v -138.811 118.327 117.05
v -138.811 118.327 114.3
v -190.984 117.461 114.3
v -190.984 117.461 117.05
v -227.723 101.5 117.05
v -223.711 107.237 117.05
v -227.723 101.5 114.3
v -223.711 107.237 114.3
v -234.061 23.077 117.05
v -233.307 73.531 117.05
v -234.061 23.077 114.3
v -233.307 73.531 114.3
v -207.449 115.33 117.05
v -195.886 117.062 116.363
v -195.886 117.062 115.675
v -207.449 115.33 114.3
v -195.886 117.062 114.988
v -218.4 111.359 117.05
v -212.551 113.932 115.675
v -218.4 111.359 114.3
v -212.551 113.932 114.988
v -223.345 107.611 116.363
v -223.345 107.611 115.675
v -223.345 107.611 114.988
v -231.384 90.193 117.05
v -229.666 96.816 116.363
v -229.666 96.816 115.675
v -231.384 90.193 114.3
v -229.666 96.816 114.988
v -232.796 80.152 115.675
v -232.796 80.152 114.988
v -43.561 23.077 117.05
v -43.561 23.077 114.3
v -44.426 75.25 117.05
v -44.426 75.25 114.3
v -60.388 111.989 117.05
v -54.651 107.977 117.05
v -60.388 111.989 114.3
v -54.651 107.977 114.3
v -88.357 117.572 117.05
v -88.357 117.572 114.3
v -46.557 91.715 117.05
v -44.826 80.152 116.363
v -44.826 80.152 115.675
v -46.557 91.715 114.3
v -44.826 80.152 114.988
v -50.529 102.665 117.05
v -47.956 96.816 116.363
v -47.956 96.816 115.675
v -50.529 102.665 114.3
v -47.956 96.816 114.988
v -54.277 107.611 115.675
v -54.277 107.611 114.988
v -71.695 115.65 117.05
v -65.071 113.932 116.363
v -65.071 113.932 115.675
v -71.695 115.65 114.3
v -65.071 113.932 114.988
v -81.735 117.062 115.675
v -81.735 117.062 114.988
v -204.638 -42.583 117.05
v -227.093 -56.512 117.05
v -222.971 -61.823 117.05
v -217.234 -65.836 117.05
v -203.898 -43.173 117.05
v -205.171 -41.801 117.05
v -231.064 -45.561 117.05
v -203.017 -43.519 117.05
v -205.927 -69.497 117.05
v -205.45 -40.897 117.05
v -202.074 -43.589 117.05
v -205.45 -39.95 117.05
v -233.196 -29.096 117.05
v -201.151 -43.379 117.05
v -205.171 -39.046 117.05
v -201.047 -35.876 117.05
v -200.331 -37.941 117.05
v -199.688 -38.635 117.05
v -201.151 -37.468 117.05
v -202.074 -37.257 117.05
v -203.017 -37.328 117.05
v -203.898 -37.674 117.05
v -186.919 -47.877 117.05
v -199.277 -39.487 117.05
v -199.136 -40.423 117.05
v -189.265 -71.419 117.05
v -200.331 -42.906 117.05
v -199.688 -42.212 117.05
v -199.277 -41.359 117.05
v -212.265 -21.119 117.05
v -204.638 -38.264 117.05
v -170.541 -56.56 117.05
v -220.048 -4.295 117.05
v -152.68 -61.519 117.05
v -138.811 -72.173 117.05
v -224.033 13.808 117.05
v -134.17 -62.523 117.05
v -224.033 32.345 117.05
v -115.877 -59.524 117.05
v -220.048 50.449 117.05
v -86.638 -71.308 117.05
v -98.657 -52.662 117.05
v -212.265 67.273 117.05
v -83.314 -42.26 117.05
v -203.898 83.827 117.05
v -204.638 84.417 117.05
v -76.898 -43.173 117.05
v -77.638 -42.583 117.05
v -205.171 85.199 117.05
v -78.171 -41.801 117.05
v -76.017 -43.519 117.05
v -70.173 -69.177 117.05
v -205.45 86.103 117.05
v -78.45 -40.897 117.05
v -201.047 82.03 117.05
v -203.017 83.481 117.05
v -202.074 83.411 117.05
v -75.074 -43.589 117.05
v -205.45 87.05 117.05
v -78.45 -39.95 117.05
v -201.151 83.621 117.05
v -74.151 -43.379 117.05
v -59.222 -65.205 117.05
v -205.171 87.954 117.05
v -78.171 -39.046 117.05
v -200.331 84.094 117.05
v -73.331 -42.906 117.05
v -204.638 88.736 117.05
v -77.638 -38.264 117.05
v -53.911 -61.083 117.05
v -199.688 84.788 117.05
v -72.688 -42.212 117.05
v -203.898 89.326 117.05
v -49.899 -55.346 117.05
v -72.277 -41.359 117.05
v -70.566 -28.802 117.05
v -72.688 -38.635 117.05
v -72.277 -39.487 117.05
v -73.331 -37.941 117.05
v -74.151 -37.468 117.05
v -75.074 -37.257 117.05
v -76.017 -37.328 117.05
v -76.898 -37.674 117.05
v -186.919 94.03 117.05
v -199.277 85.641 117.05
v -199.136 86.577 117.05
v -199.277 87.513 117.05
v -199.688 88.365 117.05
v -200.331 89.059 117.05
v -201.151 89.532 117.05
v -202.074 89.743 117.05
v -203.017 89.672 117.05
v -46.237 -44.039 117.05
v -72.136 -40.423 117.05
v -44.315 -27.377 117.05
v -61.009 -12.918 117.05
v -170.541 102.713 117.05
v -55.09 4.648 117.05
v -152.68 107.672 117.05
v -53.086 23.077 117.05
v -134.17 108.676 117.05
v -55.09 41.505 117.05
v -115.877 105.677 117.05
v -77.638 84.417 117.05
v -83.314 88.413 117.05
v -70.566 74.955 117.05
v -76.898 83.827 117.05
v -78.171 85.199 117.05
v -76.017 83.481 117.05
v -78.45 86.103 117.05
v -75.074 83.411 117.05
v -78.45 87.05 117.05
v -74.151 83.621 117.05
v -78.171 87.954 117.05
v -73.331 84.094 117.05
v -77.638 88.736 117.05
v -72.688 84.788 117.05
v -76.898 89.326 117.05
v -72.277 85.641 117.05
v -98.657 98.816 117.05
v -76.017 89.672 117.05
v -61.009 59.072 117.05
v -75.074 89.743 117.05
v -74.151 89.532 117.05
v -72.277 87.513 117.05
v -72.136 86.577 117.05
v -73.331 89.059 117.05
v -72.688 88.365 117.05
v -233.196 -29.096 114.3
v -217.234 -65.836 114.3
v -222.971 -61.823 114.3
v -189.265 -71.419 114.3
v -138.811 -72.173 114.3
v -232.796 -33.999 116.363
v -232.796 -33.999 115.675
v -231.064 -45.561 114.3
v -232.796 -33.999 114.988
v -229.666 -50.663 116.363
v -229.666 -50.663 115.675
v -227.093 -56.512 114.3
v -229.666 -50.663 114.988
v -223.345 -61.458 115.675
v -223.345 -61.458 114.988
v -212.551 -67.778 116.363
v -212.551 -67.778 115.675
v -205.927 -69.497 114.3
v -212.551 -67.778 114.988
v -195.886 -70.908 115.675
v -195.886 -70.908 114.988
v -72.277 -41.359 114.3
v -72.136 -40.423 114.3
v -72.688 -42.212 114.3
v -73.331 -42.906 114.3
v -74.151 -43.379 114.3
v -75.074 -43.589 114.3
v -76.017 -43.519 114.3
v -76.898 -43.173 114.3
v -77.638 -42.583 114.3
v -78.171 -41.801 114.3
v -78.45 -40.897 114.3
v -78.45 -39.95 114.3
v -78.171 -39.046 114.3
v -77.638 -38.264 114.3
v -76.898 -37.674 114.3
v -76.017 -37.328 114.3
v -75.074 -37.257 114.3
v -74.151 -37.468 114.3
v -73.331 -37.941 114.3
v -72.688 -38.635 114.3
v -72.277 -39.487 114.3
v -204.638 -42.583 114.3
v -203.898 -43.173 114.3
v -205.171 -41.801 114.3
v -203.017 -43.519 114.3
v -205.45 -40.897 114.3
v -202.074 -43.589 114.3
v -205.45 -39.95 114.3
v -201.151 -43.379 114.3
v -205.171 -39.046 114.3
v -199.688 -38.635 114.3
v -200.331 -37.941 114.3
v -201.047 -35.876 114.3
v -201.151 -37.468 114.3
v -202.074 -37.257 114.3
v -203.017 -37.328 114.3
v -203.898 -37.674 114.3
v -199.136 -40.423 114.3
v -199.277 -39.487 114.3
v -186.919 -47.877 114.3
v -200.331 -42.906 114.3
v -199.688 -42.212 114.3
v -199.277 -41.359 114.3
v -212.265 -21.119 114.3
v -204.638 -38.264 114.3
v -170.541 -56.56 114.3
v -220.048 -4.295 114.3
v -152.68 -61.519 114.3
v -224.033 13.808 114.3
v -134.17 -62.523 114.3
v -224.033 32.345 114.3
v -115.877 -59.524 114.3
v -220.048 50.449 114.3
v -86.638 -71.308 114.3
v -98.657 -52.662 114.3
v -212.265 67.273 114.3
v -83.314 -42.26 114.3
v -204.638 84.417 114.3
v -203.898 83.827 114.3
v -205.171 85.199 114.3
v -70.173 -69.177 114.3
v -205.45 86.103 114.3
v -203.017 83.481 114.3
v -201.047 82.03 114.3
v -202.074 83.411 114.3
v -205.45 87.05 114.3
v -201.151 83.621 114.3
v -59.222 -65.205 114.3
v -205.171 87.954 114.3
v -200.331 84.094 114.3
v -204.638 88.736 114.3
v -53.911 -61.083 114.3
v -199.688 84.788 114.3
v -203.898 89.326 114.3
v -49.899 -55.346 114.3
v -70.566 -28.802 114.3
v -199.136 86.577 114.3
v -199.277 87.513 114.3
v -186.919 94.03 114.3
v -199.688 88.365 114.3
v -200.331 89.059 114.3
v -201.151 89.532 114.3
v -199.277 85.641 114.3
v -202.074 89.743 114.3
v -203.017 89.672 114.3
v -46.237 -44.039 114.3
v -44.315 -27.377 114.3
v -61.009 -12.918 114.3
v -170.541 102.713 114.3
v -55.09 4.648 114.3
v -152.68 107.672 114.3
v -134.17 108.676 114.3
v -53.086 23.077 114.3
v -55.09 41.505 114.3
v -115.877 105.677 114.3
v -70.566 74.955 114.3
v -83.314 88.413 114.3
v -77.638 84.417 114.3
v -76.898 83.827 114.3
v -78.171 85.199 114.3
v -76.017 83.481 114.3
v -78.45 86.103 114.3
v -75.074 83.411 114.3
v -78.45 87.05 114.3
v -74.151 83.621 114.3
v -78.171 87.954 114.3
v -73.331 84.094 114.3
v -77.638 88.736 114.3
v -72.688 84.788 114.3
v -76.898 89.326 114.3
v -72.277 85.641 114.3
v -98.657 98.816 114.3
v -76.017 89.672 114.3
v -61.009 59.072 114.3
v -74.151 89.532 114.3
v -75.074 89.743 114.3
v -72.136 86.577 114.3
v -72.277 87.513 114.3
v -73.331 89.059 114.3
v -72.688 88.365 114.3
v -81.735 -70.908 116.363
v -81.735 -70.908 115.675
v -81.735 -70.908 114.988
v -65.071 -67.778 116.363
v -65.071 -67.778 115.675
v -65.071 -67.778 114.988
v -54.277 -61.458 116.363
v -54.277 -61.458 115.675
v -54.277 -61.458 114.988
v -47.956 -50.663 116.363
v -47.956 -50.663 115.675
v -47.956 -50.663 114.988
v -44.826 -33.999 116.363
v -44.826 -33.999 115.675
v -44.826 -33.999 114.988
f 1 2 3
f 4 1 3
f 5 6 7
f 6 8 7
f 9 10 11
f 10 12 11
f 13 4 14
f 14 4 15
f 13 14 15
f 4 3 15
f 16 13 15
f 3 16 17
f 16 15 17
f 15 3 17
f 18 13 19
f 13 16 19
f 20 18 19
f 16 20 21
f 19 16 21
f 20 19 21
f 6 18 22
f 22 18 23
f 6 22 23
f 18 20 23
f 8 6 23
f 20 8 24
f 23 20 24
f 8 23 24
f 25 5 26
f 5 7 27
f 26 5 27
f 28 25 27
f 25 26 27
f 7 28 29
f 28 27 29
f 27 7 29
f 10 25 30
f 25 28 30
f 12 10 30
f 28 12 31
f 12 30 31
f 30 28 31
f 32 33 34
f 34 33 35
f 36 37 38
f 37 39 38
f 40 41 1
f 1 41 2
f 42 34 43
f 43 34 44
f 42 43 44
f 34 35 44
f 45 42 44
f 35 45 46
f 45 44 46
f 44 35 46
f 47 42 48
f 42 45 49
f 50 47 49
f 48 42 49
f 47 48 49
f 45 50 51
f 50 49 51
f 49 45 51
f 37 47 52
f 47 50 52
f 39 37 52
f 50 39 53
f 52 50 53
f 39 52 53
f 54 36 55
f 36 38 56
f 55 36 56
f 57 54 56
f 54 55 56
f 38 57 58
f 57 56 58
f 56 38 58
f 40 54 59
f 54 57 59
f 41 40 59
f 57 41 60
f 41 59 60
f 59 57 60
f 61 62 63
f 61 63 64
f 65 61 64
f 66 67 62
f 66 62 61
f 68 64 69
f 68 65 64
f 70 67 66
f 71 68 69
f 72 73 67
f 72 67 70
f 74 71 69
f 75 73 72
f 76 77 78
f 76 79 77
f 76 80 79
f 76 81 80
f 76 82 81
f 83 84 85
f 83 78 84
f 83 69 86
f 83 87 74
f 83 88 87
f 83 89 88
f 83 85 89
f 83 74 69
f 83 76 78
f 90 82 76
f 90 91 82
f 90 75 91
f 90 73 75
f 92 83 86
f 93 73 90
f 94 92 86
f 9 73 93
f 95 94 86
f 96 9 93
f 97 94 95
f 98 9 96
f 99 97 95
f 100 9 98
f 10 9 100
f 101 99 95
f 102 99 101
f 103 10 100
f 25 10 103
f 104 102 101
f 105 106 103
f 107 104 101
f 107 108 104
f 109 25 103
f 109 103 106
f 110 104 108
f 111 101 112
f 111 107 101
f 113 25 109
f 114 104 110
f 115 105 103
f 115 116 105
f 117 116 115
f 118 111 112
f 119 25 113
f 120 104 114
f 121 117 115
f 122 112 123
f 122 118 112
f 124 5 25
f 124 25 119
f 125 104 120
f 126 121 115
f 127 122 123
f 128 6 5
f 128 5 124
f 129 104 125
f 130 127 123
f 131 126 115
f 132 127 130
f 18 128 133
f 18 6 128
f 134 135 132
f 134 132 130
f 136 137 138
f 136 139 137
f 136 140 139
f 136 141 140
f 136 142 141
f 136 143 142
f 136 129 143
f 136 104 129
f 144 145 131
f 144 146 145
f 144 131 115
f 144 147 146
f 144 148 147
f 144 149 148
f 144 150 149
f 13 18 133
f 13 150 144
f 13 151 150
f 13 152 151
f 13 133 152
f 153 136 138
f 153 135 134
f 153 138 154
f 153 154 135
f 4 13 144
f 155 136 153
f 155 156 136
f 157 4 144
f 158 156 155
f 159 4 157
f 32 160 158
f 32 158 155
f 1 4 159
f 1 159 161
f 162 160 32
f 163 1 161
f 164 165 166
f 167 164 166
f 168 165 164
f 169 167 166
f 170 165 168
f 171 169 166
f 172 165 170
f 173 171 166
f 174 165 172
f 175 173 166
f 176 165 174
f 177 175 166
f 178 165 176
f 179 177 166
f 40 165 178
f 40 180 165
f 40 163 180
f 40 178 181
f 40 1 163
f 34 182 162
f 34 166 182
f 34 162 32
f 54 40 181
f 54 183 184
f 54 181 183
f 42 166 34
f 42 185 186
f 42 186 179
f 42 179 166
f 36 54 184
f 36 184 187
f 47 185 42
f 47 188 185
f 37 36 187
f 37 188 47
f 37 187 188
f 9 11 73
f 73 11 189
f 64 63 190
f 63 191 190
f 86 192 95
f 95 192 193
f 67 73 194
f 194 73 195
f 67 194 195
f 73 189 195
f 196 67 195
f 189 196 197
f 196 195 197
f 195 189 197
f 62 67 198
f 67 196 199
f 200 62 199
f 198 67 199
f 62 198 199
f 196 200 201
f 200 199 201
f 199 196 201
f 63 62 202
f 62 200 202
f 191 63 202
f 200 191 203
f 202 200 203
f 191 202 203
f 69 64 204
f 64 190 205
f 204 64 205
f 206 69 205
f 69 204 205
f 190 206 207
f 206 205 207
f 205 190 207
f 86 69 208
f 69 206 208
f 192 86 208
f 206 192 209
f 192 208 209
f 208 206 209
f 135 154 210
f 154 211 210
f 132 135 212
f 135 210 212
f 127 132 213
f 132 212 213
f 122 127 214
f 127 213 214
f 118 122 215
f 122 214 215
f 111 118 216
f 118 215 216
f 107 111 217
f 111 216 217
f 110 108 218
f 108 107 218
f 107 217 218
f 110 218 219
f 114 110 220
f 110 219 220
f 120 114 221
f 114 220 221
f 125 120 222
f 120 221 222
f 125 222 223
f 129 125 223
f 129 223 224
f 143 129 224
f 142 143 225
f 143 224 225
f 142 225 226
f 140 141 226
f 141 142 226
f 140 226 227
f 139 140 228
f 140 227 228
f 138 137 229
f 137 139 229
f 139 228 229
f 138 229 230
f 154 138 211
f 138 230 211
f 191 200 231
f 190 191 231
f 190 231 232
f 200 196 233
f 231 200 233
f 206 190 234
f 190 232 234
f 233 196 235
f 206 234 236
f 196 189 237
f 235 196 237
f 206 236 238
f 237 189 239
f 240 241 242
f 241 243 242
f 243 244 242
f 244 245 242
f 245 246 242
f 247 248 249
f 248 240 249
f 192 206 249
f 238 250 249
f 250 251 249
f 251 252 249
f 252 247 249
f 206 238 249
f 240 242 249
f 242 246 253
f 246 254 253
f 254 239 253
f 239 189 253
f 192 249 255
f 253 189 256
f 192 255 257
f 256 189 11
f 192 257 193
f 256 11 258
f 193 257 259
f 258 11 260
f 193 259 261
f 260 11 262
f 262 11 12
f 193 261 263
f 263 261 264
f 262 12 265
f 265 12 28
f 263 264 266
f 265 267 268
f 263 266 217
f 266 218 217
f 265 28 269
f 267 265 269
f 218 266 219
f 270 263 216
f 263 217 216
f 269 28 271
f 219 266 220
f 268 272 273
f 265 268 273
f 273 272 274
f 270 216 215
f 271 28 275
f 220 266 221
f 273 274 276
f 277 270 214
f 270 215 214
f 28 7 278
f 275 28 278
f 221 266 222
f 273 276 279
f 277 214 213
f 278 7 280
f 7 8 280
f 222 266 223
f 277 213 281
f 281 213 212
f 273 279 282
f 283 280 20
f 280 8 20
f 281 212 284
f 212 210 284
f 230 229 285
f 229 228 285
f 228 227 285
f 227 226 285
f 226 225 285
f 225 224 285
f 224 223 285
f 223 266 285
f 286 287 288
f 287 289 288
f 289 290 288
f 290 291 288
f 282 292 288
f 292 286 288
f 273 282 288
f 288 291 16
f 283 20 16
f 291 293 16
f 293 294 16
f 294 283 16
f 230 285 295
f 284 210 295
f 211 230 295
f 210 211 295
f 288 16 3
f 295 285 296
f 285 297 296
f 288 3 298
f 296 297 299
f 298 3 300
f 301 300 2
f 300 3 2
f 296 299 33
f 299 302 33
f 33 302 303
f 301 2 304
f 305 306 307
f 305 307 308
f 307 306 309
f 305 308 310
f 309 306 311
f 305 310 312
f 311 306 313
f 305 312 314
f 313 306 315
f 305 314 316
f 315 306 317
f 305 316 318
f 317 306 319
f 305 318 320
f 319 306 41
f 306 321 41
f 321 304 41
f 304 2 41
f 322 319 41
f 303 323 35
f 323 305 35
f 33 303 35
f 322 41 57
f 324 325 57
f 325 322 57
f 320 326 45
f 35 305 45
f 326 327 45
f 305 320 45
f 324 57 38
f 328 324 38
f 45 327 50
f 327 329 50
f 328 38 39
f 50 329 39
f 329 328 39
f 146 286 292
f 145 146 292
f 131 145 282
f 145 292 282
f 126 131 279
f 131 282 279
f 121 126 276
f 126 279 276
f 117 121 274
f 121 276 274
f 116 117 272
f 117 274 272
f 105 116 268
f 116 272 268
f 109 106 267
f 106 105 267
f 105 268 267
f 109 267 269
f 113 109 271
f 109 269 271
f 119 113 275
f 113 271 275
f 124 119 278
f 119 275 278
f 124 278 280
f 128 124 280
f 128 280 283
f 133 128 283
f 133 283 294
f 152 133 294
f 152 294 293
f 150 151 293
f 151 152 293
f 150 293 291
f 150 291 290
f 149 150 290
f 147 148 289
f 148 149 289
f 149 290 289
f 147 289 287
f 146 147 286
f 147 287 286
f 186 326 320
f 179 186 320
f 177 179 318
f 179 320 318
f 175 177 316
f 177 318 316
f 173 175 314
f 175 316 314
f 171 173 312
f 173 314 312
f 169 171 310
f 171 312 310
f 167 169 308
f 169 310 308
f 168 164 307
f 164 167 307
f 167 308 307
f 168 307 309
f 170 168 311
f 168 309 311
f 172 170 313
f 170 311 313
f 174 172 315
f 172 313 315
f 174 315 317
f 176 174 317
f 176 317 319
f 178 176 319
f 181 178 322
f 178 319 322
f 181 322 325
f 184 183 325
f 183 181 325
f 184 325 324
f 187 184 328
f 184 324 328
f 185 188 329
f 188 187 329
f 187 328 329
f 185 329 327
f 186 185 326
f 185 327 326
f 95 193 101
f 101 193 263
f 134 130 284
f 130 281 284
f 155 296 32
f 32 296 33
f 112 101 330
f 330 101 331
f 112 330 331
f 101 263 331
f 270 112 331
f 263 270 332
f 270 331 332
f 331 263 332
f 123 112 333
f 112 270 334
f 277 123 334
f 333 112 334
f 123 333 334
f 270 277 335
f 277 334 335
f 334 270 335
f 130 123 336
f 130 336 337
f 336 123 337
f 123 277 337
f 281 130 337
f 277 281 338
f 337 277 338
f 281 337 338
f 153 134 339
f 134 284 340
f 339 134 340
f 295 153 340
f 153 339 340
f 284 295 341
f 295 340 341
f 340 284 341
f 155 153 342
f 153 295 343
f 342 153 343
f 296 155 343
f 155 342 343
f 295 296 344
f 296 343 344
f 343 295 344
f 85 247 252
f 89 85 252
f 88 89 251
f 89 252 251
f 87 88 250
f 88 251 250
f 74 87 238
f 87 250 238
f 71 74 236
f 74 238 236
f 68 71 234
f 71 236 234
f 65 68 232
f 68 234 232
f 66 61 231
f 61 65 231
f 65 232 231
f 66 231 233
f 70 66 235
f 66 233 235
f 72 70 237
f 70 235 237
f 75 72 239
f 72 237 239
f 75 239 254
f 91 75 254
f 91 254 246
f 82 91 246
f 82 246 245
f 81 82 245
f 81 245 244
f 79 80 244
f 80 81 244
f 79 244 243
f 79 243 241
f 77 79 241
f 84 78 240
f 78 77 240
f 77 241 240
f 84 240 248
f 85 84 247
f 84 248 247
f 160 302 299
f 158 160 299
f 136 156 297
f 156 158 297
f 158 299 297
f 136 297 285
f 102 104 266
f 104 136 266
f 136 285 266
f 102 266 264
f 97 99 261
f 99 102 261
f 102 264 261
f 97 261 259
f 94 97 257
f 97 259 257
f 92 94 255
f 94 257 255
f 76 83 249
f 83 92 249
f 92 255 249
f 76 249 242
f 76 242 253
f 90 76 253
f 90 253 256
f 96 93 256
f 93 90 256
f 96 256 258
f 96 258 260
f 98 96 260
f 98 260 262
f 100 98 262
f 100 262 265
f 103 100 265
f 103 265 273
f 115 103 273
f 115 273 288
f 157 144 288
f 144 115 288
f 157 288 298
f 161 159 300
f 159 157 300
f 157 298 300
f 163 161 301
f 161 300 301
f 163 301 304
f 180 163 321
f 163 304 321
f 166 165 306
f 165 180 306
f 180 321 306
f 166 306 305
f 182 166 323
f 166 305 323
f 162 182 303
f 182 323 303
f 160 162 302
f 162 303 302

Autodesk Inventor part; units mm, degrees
ref_plane "YZ Plane" through (0, 0, 0) normal (1, 0, 0) x (0, 1, 0)
ref_plane "XZ Plane" through (0, 0, 0) normal (0, 1, 0) x (-1, 0, 0)
ref_plane "XY Plane" through (0, 0, 0) normal (0, 0, 1) x (1, 0, 0)
ref_plane "Work Plane1" through (-138.8109, 23.0767, 114.3) normal (0, 0, 1) x (1, 0, 0)
sketch "Sketch1" plane through (-138.8109, 23.0767, 114.3) normal (0, 0, 1) x (1, 0, 0)
  spline S0 degree 4 poles (0, 95.25) (-76.2, 95.25) (-95.25, 95.25) (-95.25, 76.2) (-95.25, 0) knots 1 1 1 1 1 2 2 2 2 2 projected
  spline S1 degree 4 poles (95.25, 0) (95.25, 76.2) (95.25, 95.25) (76.2, 95.25) (0, 95.25) knots 1 1 1 1 1 2 2 2 2 2 projected
  spline S2 degree 4 poles (0, -95.25) (76.2, -95.25) (95.25, -95.25) (95.25, -76.2) (95.25, 0) knots 1 1 1 1 1 2 2 2 2 2 projected
  spline S3 degree 4 poles (-95.25, 0) (-95.25, -76.2) (-95.25, -95.25) (-76.2, -95.25) (0, -95.25) knots 1 1 1 1 1 2 2 2 2 2 projected
  line L0 (0, 95.25) -> (0, -95.25) construction
  line L1 (95.25, 0) -> (-95.25, 0) construction
  spline S4 degree 3 poles (-93.6625, 0) (-93.6625, 13.1515) (-93.6641, 24.3836) (-93.4921, 34.0057) (-93.1277, 54.3921) (-91.9513, 67.5764) (-88.2745, 76.0527) (-86.2377, 80.7481) (-83.4985, 84.0104) (-79.5283, 86.4707) (-74.4505, 89.6173) (-67.2348, 91.4109) (-56.937, 92.4035) (-43.6826, 93.6811) (-25.4087, 93.6625) (0, 93.6625) knots -2 -2 -2 -2 -1.870556 -1.870556 -1.870556 -1.596305 -1.596305 -1.596305 -1.444385 -1.444385 -1.444385 -1.250085 -1.250085 -1.250085 -1 -1 -1 -1 construction
  spline S5 degree 3 poles (0, 93.6625) (13.1515, 93.6625) (24.3836, 93.6642) (34.0057, 93.4922) (54.392, 93.1278) (67.5764, 91.9513) (76.0526, 88.2745) (80.748, 86.2378) (84.0104, 83.4986) (86.4706, 79.5283) (89.6173, 74.4505) (91.4109, 67.2348) (92.4035, 56.937) (93.681, 43.6826) (93.6625, 25.4087) (93.6625, 0) knots -2 -2 -2 -2 -1.870556 -1.870556 -1.870556 -1.596305 -1.596305 -1.596305 -1.444385 -1.444385 -1.444385 -1.250085 -1.250085 -1.250085 -1 -1 -1 -1 construction
  spline S6 degree 3 poles (0, -93.6625) (-13.1515, -93.6625) (-24.3836, -93.6641) (-34.0057, -93.4921) (-54.392, -93.1277) (-67.5764, -91.9512) (-76.0526, -88.2744) (-80.748, -86.2377) (-84.0104, -83.4985) (-86.4706, -79.5283) (-89.6173, -74.4505) (-91.4109, -67.2347) (-92.4035, -56.9369) (-93.681, -43.6826) (-93.6625, -25.4086) (-93.6625, 0) knots -2 -2 -2 -2 -1.870556 -1.870556 -1.870556 -1.596305 -1.596305 -1.596305 -1.444385 -1.444385 -1.444385 -1.250085 -1.250085 -1.250085 -1 -1 -1 -1 construction
  spline S7 degree 3 poles (93.6625, 0) (93.6625, -13.1514) (93.6641, -24.3836) (93.4921, -34.0057) (93.1277, -54.392) (91.9513, -67.5763) (88.2745, -76.0526) (86.2377, -80.748) (83.4985, -84.0103) (79.5283, -86.4706) (74.4505, -89.6172) (67.2348, -91.4108) (56.937, -92.4034) (43.6826, -93.681) (25.4087, -93.6625) (0, -93.6625) knots -2 -2 -2 -2 -1.870556 -1.870556 -1.870556 -1.596305 -1.596305 -1.596305 -1.444385 -1.444385 -1.444385 -1.250085 -1.250085 -1.250085 -1 -1 -1 -1 construction
  line L2 (-63.5, 63.5) -> (63.5, 63.5) construction
  line L3 (63.5, 63.5) -> (63.5, -63.5) construction
  line L4 (63.5, -63.5) -> (-63.5, -63.5) construction
  line L5 (-63.5, -63.5) -> (-63.5, 63.5) construction
  circle A0 centre (0, 0) radius 85.725
  circle A1 centre (63.5, 63.5) radius 3.175
  circle A2 centre (-63.5, 63.5) radius 3.175
  circle A3 centre (-63.5, -63.5) radius 3.175
  circle A4 centre (63.5, -63.5) radius 3.175
  point P0 (138.8109, -23.0767)
  dimension "d0" = 127
  dimension "d1" = 127
  dimension "d2" = 63.5
  dimension "d3" = 63.5
  dimension "d4" = 171.45
  dimension "d7" = 6.35
  dimension "d8" = 6.35
  dimension "d9" = 6.35
  dimension "d10" = 6.35
extrude "Extrusion1" add sketch "Sketch1" along normal blind 2.75
properties part number "Frame Lower"
